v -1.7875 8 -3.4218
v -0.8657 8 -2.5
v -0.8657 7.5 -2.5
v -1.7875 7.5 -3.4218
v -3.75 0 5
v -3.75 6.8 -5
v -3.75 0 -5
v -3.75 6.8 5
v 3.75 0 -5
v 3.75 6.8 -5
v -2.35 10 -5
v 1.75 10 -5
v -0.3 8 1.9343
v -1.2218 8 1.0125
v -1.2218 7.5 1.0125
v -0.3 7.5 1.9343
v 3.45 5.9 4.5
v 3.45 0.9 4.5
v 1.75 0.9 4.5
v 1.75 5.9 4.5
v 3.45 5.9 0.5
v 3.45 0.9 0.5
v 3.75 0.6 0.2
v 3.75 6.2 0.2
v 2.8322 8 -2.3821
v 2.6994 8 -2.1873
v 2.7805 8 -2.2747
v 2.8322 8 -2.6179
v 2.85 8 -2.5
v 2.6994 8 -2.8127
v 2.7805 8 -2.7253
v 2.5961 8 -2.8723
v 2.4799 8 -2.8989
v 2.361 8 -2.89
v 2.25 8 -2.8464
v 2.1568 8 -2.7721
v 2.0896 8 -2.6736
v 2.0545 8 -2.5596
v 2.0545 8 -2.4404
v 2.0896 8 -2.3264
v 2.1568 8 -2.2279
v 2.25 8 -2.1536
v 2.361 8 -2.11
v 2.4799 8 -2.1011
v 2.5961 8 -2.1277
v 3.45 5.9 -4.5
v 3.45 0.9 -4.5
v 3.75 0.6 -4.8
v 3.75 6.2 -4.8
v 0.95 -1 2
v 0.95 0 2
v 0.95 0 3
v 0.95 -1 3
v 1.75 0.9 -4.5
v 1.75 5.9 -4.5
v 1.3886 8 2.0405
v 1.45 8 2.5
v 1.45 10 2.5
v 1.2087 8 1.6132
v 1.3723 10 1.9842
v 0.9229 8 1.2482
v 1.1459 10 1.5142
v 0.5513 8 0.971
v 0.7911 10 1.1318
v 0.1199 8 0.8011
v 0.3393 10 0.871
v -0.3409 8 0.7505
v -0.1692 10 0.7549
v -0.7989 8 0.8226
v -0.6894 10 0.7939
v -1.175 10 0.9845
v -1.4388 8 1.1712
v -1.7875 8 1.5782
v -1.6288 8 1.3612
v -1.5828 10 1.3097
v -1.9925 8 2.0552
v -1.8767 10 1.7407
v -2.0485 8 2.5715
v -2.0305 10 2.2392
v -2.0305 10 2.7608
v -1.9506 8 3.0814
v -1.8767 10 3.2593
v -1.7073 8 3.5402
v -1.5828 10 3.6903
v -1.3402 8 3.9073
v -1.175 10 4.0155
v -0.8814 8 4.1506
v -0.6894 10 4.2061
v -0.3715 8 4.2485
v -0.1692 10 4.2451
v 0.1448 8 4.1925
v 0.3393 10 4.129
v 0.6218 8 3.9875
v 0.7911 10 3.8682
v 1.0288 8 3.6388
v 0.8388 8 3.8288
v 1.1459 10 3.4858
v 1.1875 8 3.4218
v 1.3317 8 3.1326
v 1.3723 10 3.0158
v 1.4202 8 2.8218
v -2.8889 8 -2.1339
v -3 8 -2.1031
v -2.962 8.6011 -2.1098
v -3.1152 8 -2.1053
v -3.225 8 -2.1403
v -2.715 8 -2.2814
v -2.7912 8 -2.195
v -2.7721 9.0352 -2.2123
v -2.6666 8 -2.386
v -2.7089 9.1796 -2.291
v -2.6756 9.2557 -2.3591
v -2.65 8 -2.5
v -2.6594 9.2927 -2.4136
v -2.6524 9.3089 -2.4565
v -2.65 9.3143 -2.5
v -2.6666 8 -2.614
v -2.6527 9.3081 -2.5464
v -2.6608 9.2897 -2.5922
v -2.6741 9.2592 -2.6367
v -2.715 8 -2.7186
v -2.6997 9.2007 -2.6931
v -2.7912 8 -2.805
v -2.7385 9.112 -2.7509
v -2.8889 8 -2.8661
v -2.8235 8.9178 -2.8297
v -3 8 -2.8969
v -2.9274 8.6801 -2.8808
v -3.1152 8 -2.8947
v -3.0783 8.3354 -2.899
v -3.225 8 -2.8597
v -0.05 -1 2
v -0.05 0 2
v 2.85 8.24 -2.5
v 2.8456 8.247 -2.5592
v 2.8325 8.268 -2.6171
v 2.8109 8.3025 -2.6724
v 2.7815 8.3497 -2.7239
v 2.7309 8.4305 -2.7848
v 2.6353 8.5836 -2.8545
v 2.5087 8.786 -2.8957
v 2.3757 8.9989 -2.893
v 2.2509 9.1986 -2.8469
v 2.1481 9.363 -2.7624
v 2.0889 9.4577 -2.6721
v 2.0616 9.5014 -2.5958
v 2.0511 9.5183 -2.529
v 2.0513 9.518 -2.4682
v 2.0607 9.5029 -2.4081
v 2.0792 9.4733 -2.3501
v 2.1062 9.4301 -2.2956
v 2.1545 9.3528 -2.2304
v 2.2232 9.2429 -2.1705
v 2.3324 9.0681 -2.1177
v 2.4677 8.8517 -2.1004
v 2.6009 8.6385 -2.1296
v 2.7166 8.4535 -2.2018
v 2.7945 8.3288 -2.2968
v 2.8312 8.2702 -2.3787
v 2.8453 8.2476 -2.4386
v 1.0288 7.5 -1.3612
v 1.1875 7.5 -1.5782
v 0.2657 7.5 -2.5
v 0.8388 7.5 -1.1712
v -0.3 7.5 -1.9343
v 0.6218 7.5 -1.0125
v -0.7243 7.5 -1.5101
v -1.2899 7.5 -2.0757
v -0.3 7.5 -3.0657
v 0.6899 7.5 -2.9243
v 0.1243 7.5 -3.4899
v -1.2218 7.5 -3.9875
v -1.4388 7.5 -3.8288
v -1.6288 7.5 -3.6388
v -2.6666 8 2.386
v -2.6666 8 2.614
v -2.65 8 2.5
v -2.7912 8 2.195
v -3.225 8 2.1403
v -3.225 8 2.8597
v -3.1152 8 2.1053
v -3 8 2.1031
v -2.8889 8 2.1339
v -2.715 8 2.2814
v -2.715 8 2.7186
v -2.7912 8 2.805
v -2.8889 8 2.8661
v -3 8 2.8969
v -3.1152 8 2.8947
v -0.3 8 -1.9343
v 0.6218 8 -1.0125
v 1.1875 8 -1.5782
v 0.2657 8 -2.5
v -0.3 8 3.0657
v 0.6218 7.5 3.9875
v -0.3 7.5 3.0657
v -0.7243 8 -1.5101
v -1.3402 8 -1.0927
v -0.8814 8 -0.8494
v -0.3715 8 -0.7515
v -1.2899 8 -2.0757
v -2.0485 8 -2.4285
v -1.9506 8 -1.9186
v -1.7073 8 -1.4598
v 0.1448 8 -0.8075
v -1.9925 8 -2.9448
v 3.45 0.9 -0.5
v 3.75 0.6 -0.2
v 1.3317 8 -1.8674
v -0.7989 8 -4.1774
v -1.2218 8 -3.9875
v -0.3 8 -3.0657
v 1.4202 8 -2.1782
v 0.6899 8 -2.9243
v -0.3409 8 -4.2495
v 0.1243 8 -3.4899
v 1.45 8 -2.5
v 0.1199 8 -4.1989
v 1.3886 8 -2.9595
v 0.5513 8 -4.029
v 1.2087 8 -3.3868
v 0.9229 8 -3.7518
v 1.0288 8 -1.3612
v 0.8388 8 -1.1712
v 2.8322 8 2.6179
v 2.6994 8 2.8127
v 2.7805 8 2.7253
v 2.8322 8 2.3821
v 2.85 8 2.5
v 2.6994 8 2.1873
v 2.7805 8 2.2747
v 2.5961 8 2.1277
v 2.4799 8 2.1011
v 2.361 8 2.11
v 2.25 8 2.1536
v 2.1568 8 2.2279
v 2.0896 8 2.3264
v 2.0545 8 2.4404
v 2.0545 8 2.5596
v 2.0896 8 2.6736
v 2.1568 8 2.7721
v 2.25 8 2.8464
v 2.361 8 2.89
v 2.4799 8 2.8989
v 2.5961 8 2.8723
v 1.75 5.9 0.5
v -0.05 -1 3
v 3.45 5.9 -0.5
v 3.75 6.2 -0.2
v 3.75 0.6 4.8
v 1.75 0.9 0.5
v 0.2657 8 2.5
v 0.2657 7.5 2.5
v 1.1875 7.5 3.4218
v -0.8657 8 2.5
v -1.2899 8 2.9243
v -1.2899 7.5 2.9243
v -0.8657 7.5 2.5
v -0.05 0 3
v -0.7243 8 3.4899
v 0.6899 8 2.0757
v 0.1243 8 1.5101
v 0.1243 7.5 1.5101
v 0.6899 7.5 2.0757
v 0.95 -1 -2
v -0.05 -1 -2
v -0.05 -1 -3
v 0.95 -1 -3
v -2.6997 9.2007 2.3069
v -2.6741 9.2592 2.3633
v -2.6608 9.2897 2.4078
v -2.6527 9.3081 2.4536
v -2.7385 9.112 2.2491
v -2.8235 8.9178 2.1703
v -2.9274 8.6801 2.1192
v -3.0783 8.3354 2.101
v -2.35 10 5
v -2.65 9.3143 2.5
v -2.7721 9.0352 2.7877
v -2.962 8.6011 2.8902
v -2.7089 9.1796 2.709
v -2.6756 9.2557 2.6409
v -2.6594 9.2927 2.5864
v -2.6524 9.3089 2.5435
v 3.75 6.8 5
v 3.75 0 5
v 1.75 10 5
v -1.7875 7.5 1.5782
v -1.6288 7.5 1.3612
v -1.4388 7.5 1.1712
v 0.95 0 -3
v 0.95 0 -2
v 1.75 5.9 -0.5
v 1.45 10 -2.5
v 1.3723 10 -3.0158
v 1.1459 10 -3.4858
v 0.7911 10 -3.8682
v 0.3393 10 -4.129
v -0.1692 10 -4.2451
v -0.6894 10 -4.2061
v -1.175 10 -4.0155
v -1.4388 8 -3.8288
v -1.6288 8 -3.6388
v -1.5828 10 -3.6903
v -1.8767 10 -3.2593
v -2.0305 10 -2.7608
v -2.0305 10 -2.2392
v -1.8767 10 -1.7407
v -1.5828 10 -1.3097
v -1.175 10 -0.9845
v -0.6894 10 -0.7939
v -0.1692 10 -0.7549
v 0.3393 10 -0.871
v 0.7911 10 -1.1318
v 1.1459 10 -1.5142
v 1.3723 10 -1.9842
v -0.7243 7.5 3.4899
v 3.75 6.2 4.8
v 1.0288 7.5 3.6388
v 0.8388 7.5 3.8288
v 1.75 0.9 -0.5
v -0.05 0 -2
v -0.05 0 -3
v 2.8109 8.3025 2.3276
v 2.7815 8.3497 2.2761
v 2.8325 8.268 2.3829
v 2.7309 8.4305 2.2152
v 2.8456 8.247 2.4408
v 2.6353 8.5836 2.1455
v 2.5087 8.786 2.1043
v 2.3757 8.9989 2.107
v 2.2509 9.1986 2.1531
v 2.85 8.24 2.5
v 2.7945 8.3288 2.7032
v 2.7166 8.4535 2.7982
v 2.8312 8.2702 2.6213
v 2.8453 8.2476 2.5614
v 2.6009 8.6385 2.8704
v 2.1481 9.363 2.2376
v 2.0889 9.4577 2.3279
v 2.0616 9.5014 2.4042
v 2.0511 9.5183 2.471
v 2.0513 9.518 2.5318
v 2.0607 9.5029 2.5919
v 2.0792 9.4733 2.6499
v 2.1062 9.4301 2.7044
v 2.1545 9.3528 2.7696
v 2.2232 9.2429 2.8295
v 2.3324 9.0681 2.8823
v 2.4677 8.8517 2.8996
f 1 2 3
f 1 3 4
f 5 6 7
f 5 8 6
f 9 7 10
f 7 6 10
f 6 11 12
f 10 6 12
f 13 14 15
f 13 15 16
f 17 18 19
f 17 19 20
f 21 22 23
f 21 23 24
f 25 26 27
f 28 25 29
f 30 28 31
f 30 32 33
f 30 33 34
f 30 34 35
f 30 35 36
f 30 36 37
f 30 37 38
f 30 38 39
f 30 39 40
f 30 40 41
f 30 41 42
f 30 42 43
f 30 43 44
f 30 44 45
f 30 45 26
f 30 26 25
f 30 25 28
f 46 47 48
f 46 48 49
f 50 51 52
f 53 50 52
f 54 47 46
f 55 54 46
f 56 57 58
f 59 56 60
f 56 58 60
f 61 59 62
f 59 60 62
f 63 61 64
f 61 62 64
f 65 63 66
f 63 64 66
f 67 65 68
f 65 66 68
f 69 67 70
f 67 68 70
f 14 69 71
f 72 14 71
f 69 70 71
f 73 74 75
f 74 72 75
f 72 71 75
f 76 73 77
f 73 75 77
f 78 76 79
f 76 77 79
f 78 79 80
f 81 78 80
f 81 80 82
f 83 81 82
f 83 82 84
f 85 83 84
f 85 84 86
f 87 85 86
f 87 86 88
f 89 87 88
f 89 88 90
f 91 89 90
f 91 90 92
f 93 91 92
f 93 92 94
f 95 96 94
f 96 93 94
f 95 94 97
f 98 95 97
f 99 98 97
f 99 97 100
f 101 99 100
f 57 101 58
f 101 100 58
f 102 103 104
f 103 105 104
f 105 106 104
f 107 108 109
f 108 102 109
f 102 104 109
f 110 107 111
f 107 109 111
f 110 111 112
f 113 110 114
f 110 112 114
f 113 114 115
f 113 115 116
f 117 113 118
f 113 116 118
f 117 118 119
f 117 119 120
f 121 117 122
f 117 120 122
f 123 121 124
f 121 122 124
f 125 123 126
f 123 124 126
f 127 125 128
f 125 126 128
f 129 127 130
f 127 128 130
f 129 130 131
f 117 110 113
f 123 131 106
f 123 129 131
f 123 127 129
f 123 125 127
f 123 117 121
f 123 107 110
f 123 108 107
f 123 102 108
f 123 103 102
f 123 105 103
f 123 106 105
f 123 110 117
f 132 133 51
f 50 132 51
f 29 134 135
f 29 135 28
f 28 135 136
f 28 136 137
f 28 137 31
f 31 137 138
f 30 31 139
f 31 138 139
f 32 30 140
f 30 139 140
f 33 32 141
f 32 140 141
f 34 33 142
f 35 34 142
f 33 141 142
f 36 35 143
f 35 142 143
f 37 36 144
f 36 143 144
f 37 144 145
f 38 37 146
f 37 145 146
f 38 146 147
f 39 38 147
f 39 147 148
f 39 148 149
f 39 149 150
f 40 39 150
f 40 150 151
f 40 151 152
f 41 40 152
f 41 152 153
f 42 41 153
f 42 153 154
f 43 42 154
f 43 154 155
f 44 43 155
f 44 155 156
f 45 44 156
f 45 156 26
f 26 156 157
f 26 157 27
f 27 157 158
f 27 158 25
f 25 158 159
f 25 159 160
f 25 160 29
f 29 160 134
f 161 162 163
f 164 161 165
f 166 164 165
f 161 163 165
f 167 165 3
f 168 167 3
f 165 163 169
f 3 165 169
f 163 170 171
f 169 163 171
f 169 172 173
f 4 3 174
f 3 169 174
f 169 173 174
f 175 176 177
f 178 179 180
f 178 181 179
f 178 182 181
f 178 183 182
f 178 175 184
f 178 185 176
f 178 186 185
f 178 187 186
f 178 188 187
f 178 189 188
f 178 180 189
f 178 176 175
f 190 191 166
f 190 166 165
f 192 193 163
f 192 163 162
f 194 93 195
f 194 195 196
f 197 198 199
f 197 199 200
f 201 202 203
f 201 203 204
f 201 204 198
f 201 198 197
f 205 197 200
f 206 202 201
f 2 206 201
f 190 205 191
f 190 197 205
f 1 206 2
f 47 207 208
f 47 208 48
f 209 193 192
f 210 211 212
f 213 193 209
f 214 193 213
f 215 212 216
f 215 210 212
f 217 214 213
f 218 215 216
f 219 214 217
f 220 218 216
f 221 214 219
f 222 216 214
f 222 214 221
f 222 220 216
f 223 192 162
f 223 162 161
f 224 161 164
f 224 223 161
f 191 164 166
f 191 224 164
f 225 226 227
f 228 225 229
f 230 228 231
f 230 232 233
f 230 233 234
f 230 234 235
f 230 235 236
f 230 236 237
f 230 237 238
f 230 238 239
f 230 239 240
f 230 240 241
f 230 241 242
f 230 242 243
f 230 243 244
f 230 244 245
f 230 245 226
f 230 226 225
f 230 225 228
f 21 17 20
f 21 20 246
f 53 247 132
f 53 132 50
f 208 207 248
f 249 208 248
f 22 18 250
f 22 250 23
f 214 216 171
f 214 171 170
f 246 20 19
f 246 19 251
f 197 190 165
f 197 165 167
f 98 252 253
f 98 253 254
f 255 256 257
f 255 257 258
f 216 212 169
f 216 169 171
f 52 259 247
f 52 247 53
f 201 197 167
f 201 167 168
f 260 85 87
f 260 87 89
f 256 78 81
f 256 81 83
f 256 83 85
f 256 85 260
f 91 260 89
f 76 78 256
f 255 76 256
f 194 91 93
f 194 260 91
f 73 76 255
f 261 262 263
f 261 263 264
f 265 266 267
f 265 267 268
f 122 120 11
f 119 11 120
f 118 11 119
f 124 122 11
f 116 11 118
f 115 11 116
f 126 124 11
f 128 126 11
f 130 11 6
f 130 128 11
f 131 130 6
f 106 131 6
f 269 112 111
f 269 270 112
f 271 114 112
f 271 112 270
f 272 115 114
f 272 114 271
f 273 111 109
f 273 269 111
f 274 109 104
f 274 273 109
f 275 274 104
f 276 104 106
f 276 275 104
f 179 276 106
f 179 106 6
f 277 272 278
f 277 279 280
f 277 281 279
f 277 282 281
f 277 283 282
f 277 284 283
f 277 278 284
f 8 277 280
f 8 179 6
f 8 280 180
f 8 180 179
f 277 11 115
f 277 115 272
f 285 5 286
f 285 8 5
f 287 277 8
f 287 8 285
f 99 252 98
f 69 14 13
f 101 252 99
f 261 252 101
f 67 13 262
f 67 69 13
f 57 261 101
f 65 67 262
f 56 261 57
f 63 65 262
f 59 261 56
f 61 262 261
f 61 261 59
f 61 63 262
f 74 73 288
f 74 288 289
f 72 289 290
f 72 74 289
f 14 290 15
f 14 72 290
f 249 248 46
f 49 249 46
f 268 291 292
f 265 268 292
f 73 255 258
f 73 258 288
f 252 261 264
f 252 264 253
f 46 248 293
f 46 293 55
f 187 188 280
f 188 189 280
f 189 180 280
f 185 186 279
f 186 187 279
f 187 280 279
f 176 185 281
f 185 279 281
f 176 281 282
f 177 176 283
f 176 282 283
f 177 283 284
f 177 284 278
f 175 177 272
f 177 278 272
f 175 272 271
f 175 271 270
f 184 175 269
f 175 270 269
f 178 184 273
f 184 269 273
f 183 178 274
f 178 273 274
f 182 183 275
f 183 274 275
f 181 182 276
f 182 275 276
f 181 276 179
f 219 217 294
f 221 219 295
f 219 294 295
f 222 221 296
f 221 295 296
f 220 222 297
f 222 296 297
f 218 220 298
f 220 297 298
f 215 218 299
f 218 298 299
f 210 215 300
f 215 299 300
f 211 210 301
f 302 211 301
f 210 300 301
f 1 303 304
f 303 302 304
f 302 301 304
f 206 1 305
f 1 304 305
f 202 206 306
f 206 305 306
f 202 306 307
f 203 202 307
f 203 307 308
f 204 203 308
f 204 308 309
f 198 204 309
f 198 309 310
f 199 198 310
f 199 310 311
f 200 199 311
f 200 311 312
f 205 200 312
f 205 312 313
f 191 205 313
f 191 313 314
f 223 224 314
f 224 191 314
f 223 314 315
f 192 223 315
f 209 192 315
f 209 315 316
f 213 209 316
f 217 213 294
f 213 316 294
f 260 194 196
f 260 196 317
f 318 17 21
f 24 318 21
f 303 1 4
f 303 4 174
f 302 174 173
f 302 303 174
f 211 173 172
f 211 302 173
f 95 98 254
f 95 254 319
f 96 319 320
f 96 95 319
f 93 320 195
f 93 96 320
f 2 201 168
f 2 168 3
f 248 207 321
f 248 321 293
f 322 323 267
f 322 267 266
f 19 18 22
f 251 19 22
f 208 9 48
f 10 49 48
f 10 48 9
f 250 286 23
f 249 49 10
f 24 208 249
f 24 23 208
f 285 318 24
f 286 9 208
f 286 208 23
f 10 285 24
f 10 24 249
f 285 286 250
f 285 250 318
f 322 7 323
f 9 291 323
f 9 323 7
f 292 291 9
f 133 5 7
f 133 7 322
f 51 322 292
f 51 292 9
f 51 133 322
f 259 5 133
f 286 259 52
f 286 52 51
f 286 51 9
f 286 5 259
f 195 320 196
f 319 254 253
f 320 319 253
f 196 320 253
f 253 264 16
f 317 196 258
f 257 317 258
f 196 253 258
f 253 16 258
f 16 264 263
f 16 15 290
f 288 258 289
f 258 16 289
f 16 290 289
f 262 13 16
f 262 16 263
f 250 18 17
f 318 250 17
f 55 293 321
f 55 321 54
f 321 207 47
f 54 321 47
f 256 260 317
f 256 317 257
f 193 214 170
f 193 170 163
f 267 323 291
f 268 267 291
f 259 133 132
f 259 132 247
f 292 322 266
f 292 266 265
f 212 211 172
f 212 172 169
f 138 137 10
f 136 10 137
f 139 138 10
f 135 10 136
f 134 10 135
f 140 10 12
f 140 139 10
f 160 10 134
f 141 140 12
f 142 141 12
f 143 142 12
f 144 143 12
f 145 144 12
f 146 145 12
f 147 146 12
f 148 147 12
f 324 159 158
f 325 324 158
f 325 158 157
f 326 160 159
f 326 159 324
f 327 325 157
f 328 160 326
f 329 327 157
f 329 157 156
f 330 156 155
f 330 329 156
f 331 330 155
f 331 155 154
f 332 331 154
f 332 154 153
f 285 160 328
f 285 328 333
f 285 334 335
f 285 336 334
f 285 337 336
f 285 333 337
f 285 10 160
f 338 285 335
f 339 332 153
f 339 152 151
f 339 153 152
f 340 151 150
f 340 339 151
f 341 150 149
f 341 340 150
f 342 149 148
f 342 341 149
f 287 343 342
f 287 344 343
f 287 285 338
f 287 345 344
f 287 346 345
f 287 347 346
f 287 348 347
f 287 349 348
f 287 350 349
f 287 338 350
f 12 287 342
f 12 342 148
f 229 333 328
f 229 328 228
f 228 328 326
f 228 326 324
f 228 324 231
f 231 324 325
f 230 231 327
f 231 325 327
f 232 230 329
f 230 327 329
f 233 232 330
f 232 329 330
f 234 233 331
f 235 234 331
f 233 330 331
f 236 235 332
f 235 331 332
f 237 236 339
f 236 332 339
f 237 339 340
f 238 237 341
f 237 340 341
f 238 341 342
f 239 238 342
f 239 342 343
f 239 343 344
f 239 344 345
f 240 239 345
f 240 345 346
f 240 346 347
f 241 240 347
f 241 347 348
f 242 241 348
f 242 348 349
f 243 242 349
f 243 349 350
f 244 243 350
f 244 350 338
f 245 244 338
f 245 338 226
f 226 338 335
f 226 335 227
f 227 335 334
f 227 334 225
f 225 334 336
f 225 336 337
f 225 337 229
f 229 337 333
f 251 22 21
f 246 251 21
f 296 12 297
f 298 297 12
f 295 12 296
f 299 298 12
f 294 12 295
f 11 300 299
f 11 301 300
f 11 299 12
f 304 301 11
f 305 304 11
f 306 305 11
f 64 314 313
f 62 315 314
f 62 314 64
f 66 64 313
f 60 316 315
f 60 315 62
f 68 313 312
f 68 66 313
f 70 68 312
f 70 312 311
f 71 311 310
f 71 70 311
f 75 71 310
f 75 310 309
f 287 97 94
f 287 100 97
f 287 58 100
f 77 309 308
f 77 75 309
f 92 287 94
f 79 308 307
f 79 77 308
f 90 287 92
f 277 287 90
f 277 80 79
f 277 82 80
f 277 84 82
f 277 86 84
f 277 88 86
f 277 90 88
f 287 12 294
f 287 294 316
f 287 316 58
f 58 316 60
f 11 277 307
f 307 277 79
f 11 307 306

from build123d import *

# Parameters (mm, degrees)
BOSS_EXTRUDE1_DEPTH = 5
SKETCH2_W           = 1
SKETCH2_H           = 1
BOSS_EXTRUDE2_DEPTH = 1
SKETCH3_W           = 4
SKETCH3_H           = 5
CUT_EXTRUDE1_DEPTH  = 2
SKETCH4_R           = 1.75
SKETCH4_R_2         = 0.4
CUT_EXTRUDE2_DEPTH  = 2
CUT_EXTRUDE3_DEPTH  = 0.5
CHAMFER1_SIZE       = 0.3


with BuildPart() as part:
    # Sketch1 → Boss-Extrude1 (new body, symmetric)
    with BuildSketch(Plane.XY):
        Polygon((-3.75, 0), (3.75, 0), (3.75, 6.8), (1.75, 10), (-2.35, 10), (-3.75, 6.8), align=None)
    extrude(amount=BOSS_EXTRUDE1_DEPTH, both=True)

    # Sketch2 → Boss-Extrude2 (add)
    with BuildSketch(Plane.XZ):
        with Locations((0.45, 2.5)):
            Rectangle(SKETCH2_W, SKETCH2_H)
        with Locations((0.45, -2.5)):
            Rectangle(SKETCH2_W, SKETCH2_H)
    extrude(amount=BOSS_EXTRUDE2_DEPTH)

    # Sketch3 → Cut-Extrude1 (cut)
    with BuildSketch(Plane(origin=(3.75, 0, 0), x_dir=(0, 0, -1), z_dir=(1, 0, 0))):
        with Locations((-2.5, 3.4)):
            Rectangle(SKETCH3_W, SKETCH3_H)
        with Locations((2.5, 3.4)):
            Rectangle(SKETCH3_W, SKETCH3_H)
    extrude(amount=-CUT_EXTRUDE1_DEPTH, mode=Mode.SUBTRACT)

    # Sketch4 → Cut-Extrude2 (cut)
    with BuildSketch(Plane(origin=(0, 10, 0), x_dir=(1, 0, 0), z_dir=(0, 1, 0))):
        with Locations((-0.3, 2.5)):
            Circle(SKETCH4_R)
        with Locations((-0.3, -2.5)):
            Circle(SKETCH4_R)
        with Locations((2.45, 2.5)):
            Circle(SKETCH4_R_2)
        with Locations((2.45, -2.5)):
            Circle(SKETCH4_R_2)
        with Locations((-3.05, 2.5)):
            Circle(SKETCH4_R_2)
        with Locations((-3.05, -2.5)):
            Circle(SKETCH4_R_2)
    extrude(amount=-CUT_EXTRUDE2_DEPTH, mode=Mode.SUBTRACT)

    # Sketch5 → Cut-Extrude3 (cut)
    with BuildSketch(Plane(origin=(0, 8, 0), x_dir=(1, 0, 0), z_dir=(0, 1, 0))):
        with BuildLine():
            Line((-1.221836, -1.012479), (-0.3, -1.934315))
            Line((-0.3, -1.934315), (0.124264, -1.510051))
            Line((0.124264, -1.510051), (0.689949, -2.075736))
            Line((0.689949, -2.075736), (0.265685, -2.5))
            Line((0.265685, -2.5), (1.187521, -3.421836))
            ThreePointArc((1.187521, -3.421836), (0.937437, -3.737437), (0.621836, -3.987521))
            Line((0.621836, -3.987521), (-0.3, -3.065685))
            Line((-0.3, -3.065685), (-0.724264, -3.489949))
            Line((-0.724264, -3.489949), (-1.289949, -2.924264))
            Line((-1.289949, -2.924264), (-0.865685, -2.5))
            Line((-0.865685, -2.5), (-1.787521, -1.578164))
            ThreePointArc((-1.787521, -1.578164), (-1.537437, -1.262563), (-1.221836, -1.012479))
        make_face()
        with BuildLine():
            Line((-1.221836, 3.987521), (-0.3, 3.065685))
            Line((-0.3, 3.065685), (0.124264, 3.489949))
            Line((0.124264, 3.489949), (0.689949, 2.924264))
            Line((0.689949, 2.924264), (0.265685, 2.5))
            Line((0.265685, 2.5), (1.187521, 1.578164))
            ThreePointArc((1.187521, 1.578164), (0.937437, 1.262563), (0.621836, 1.012479))
            Line((0.621836, 1.012479), (-0.3, 1.934315))
            Line((-0.3, 1.934315), (-0.724264, 1.510051))
            Line((-0.724264, 1.510051), (-1.289949, 2.075736))
            Line((-1.289949, 2.075736), (-0.865685, 2.5))
            Line((-0.865685, 2.5), (-1.787521, 3.421836))
            ThreePointArc((-1.787521, 3.421836), (-1.537437, 3.737437), (-1.221836, 3.987521))
        make_face()
        with BuildLine():
            Line((-1.221836, -6.012479), (-0.3, -6.934315))
            Line((-0.3, -6.934315), (0.124264, -6.510051))
            Line((0.124264, -6.510051), (0.689949, -7.075736))
            Line((0.689949, -7.075736), (0.265685, -7.5))
            Line((0.265685, -7.5), (1.187521, -8.421836))
            ThreePointArc((1.187521, -8.421836), (0.937437, -8.737437), (0.621836, -8.987521))
            Line((0.621836, -8.987521), (-0.3, -8.065685))
            Line((-0.3, -8.065685), (-0.724264, -8.489949))
            Line((-0.724264, -8.489949), (-1.289949, -7.924264))
            Line((-1.289949, -7.924264), (-0.865685, -7.5))
            Line((-0.865685, -7.5), (-1.787521, -6.578164))
            ThreePointArc((-1.787521, -6.578164), (-1.537437, -6.262563), (-1.221836, -6.012479))
        make_face()
    extrude(amount=-CUT_EXTRUDE3_DEPTH, mode=Mode.SUBTRACT)

    # Chamfer1
    chamfer1_edges = [part.edges().sort_by_distance(p)[0] for p in [
        (3.75, 3.4, 4.5),
        (3.75, 0.9, 2.5),
        (3.75, 3.4, 0.5),
        (3.75, 5.9, 2.5),
        (3.75, 3.4, -0.5),
        (3.75, 0.9, -2.5),
        (3.75, 3.4, -4.5),
        (3.75, 5.9, -2.5),
    ]]
    chamfer(chamfer1_edges, length=CHAMFER1_SIZE)


solid = part.part
